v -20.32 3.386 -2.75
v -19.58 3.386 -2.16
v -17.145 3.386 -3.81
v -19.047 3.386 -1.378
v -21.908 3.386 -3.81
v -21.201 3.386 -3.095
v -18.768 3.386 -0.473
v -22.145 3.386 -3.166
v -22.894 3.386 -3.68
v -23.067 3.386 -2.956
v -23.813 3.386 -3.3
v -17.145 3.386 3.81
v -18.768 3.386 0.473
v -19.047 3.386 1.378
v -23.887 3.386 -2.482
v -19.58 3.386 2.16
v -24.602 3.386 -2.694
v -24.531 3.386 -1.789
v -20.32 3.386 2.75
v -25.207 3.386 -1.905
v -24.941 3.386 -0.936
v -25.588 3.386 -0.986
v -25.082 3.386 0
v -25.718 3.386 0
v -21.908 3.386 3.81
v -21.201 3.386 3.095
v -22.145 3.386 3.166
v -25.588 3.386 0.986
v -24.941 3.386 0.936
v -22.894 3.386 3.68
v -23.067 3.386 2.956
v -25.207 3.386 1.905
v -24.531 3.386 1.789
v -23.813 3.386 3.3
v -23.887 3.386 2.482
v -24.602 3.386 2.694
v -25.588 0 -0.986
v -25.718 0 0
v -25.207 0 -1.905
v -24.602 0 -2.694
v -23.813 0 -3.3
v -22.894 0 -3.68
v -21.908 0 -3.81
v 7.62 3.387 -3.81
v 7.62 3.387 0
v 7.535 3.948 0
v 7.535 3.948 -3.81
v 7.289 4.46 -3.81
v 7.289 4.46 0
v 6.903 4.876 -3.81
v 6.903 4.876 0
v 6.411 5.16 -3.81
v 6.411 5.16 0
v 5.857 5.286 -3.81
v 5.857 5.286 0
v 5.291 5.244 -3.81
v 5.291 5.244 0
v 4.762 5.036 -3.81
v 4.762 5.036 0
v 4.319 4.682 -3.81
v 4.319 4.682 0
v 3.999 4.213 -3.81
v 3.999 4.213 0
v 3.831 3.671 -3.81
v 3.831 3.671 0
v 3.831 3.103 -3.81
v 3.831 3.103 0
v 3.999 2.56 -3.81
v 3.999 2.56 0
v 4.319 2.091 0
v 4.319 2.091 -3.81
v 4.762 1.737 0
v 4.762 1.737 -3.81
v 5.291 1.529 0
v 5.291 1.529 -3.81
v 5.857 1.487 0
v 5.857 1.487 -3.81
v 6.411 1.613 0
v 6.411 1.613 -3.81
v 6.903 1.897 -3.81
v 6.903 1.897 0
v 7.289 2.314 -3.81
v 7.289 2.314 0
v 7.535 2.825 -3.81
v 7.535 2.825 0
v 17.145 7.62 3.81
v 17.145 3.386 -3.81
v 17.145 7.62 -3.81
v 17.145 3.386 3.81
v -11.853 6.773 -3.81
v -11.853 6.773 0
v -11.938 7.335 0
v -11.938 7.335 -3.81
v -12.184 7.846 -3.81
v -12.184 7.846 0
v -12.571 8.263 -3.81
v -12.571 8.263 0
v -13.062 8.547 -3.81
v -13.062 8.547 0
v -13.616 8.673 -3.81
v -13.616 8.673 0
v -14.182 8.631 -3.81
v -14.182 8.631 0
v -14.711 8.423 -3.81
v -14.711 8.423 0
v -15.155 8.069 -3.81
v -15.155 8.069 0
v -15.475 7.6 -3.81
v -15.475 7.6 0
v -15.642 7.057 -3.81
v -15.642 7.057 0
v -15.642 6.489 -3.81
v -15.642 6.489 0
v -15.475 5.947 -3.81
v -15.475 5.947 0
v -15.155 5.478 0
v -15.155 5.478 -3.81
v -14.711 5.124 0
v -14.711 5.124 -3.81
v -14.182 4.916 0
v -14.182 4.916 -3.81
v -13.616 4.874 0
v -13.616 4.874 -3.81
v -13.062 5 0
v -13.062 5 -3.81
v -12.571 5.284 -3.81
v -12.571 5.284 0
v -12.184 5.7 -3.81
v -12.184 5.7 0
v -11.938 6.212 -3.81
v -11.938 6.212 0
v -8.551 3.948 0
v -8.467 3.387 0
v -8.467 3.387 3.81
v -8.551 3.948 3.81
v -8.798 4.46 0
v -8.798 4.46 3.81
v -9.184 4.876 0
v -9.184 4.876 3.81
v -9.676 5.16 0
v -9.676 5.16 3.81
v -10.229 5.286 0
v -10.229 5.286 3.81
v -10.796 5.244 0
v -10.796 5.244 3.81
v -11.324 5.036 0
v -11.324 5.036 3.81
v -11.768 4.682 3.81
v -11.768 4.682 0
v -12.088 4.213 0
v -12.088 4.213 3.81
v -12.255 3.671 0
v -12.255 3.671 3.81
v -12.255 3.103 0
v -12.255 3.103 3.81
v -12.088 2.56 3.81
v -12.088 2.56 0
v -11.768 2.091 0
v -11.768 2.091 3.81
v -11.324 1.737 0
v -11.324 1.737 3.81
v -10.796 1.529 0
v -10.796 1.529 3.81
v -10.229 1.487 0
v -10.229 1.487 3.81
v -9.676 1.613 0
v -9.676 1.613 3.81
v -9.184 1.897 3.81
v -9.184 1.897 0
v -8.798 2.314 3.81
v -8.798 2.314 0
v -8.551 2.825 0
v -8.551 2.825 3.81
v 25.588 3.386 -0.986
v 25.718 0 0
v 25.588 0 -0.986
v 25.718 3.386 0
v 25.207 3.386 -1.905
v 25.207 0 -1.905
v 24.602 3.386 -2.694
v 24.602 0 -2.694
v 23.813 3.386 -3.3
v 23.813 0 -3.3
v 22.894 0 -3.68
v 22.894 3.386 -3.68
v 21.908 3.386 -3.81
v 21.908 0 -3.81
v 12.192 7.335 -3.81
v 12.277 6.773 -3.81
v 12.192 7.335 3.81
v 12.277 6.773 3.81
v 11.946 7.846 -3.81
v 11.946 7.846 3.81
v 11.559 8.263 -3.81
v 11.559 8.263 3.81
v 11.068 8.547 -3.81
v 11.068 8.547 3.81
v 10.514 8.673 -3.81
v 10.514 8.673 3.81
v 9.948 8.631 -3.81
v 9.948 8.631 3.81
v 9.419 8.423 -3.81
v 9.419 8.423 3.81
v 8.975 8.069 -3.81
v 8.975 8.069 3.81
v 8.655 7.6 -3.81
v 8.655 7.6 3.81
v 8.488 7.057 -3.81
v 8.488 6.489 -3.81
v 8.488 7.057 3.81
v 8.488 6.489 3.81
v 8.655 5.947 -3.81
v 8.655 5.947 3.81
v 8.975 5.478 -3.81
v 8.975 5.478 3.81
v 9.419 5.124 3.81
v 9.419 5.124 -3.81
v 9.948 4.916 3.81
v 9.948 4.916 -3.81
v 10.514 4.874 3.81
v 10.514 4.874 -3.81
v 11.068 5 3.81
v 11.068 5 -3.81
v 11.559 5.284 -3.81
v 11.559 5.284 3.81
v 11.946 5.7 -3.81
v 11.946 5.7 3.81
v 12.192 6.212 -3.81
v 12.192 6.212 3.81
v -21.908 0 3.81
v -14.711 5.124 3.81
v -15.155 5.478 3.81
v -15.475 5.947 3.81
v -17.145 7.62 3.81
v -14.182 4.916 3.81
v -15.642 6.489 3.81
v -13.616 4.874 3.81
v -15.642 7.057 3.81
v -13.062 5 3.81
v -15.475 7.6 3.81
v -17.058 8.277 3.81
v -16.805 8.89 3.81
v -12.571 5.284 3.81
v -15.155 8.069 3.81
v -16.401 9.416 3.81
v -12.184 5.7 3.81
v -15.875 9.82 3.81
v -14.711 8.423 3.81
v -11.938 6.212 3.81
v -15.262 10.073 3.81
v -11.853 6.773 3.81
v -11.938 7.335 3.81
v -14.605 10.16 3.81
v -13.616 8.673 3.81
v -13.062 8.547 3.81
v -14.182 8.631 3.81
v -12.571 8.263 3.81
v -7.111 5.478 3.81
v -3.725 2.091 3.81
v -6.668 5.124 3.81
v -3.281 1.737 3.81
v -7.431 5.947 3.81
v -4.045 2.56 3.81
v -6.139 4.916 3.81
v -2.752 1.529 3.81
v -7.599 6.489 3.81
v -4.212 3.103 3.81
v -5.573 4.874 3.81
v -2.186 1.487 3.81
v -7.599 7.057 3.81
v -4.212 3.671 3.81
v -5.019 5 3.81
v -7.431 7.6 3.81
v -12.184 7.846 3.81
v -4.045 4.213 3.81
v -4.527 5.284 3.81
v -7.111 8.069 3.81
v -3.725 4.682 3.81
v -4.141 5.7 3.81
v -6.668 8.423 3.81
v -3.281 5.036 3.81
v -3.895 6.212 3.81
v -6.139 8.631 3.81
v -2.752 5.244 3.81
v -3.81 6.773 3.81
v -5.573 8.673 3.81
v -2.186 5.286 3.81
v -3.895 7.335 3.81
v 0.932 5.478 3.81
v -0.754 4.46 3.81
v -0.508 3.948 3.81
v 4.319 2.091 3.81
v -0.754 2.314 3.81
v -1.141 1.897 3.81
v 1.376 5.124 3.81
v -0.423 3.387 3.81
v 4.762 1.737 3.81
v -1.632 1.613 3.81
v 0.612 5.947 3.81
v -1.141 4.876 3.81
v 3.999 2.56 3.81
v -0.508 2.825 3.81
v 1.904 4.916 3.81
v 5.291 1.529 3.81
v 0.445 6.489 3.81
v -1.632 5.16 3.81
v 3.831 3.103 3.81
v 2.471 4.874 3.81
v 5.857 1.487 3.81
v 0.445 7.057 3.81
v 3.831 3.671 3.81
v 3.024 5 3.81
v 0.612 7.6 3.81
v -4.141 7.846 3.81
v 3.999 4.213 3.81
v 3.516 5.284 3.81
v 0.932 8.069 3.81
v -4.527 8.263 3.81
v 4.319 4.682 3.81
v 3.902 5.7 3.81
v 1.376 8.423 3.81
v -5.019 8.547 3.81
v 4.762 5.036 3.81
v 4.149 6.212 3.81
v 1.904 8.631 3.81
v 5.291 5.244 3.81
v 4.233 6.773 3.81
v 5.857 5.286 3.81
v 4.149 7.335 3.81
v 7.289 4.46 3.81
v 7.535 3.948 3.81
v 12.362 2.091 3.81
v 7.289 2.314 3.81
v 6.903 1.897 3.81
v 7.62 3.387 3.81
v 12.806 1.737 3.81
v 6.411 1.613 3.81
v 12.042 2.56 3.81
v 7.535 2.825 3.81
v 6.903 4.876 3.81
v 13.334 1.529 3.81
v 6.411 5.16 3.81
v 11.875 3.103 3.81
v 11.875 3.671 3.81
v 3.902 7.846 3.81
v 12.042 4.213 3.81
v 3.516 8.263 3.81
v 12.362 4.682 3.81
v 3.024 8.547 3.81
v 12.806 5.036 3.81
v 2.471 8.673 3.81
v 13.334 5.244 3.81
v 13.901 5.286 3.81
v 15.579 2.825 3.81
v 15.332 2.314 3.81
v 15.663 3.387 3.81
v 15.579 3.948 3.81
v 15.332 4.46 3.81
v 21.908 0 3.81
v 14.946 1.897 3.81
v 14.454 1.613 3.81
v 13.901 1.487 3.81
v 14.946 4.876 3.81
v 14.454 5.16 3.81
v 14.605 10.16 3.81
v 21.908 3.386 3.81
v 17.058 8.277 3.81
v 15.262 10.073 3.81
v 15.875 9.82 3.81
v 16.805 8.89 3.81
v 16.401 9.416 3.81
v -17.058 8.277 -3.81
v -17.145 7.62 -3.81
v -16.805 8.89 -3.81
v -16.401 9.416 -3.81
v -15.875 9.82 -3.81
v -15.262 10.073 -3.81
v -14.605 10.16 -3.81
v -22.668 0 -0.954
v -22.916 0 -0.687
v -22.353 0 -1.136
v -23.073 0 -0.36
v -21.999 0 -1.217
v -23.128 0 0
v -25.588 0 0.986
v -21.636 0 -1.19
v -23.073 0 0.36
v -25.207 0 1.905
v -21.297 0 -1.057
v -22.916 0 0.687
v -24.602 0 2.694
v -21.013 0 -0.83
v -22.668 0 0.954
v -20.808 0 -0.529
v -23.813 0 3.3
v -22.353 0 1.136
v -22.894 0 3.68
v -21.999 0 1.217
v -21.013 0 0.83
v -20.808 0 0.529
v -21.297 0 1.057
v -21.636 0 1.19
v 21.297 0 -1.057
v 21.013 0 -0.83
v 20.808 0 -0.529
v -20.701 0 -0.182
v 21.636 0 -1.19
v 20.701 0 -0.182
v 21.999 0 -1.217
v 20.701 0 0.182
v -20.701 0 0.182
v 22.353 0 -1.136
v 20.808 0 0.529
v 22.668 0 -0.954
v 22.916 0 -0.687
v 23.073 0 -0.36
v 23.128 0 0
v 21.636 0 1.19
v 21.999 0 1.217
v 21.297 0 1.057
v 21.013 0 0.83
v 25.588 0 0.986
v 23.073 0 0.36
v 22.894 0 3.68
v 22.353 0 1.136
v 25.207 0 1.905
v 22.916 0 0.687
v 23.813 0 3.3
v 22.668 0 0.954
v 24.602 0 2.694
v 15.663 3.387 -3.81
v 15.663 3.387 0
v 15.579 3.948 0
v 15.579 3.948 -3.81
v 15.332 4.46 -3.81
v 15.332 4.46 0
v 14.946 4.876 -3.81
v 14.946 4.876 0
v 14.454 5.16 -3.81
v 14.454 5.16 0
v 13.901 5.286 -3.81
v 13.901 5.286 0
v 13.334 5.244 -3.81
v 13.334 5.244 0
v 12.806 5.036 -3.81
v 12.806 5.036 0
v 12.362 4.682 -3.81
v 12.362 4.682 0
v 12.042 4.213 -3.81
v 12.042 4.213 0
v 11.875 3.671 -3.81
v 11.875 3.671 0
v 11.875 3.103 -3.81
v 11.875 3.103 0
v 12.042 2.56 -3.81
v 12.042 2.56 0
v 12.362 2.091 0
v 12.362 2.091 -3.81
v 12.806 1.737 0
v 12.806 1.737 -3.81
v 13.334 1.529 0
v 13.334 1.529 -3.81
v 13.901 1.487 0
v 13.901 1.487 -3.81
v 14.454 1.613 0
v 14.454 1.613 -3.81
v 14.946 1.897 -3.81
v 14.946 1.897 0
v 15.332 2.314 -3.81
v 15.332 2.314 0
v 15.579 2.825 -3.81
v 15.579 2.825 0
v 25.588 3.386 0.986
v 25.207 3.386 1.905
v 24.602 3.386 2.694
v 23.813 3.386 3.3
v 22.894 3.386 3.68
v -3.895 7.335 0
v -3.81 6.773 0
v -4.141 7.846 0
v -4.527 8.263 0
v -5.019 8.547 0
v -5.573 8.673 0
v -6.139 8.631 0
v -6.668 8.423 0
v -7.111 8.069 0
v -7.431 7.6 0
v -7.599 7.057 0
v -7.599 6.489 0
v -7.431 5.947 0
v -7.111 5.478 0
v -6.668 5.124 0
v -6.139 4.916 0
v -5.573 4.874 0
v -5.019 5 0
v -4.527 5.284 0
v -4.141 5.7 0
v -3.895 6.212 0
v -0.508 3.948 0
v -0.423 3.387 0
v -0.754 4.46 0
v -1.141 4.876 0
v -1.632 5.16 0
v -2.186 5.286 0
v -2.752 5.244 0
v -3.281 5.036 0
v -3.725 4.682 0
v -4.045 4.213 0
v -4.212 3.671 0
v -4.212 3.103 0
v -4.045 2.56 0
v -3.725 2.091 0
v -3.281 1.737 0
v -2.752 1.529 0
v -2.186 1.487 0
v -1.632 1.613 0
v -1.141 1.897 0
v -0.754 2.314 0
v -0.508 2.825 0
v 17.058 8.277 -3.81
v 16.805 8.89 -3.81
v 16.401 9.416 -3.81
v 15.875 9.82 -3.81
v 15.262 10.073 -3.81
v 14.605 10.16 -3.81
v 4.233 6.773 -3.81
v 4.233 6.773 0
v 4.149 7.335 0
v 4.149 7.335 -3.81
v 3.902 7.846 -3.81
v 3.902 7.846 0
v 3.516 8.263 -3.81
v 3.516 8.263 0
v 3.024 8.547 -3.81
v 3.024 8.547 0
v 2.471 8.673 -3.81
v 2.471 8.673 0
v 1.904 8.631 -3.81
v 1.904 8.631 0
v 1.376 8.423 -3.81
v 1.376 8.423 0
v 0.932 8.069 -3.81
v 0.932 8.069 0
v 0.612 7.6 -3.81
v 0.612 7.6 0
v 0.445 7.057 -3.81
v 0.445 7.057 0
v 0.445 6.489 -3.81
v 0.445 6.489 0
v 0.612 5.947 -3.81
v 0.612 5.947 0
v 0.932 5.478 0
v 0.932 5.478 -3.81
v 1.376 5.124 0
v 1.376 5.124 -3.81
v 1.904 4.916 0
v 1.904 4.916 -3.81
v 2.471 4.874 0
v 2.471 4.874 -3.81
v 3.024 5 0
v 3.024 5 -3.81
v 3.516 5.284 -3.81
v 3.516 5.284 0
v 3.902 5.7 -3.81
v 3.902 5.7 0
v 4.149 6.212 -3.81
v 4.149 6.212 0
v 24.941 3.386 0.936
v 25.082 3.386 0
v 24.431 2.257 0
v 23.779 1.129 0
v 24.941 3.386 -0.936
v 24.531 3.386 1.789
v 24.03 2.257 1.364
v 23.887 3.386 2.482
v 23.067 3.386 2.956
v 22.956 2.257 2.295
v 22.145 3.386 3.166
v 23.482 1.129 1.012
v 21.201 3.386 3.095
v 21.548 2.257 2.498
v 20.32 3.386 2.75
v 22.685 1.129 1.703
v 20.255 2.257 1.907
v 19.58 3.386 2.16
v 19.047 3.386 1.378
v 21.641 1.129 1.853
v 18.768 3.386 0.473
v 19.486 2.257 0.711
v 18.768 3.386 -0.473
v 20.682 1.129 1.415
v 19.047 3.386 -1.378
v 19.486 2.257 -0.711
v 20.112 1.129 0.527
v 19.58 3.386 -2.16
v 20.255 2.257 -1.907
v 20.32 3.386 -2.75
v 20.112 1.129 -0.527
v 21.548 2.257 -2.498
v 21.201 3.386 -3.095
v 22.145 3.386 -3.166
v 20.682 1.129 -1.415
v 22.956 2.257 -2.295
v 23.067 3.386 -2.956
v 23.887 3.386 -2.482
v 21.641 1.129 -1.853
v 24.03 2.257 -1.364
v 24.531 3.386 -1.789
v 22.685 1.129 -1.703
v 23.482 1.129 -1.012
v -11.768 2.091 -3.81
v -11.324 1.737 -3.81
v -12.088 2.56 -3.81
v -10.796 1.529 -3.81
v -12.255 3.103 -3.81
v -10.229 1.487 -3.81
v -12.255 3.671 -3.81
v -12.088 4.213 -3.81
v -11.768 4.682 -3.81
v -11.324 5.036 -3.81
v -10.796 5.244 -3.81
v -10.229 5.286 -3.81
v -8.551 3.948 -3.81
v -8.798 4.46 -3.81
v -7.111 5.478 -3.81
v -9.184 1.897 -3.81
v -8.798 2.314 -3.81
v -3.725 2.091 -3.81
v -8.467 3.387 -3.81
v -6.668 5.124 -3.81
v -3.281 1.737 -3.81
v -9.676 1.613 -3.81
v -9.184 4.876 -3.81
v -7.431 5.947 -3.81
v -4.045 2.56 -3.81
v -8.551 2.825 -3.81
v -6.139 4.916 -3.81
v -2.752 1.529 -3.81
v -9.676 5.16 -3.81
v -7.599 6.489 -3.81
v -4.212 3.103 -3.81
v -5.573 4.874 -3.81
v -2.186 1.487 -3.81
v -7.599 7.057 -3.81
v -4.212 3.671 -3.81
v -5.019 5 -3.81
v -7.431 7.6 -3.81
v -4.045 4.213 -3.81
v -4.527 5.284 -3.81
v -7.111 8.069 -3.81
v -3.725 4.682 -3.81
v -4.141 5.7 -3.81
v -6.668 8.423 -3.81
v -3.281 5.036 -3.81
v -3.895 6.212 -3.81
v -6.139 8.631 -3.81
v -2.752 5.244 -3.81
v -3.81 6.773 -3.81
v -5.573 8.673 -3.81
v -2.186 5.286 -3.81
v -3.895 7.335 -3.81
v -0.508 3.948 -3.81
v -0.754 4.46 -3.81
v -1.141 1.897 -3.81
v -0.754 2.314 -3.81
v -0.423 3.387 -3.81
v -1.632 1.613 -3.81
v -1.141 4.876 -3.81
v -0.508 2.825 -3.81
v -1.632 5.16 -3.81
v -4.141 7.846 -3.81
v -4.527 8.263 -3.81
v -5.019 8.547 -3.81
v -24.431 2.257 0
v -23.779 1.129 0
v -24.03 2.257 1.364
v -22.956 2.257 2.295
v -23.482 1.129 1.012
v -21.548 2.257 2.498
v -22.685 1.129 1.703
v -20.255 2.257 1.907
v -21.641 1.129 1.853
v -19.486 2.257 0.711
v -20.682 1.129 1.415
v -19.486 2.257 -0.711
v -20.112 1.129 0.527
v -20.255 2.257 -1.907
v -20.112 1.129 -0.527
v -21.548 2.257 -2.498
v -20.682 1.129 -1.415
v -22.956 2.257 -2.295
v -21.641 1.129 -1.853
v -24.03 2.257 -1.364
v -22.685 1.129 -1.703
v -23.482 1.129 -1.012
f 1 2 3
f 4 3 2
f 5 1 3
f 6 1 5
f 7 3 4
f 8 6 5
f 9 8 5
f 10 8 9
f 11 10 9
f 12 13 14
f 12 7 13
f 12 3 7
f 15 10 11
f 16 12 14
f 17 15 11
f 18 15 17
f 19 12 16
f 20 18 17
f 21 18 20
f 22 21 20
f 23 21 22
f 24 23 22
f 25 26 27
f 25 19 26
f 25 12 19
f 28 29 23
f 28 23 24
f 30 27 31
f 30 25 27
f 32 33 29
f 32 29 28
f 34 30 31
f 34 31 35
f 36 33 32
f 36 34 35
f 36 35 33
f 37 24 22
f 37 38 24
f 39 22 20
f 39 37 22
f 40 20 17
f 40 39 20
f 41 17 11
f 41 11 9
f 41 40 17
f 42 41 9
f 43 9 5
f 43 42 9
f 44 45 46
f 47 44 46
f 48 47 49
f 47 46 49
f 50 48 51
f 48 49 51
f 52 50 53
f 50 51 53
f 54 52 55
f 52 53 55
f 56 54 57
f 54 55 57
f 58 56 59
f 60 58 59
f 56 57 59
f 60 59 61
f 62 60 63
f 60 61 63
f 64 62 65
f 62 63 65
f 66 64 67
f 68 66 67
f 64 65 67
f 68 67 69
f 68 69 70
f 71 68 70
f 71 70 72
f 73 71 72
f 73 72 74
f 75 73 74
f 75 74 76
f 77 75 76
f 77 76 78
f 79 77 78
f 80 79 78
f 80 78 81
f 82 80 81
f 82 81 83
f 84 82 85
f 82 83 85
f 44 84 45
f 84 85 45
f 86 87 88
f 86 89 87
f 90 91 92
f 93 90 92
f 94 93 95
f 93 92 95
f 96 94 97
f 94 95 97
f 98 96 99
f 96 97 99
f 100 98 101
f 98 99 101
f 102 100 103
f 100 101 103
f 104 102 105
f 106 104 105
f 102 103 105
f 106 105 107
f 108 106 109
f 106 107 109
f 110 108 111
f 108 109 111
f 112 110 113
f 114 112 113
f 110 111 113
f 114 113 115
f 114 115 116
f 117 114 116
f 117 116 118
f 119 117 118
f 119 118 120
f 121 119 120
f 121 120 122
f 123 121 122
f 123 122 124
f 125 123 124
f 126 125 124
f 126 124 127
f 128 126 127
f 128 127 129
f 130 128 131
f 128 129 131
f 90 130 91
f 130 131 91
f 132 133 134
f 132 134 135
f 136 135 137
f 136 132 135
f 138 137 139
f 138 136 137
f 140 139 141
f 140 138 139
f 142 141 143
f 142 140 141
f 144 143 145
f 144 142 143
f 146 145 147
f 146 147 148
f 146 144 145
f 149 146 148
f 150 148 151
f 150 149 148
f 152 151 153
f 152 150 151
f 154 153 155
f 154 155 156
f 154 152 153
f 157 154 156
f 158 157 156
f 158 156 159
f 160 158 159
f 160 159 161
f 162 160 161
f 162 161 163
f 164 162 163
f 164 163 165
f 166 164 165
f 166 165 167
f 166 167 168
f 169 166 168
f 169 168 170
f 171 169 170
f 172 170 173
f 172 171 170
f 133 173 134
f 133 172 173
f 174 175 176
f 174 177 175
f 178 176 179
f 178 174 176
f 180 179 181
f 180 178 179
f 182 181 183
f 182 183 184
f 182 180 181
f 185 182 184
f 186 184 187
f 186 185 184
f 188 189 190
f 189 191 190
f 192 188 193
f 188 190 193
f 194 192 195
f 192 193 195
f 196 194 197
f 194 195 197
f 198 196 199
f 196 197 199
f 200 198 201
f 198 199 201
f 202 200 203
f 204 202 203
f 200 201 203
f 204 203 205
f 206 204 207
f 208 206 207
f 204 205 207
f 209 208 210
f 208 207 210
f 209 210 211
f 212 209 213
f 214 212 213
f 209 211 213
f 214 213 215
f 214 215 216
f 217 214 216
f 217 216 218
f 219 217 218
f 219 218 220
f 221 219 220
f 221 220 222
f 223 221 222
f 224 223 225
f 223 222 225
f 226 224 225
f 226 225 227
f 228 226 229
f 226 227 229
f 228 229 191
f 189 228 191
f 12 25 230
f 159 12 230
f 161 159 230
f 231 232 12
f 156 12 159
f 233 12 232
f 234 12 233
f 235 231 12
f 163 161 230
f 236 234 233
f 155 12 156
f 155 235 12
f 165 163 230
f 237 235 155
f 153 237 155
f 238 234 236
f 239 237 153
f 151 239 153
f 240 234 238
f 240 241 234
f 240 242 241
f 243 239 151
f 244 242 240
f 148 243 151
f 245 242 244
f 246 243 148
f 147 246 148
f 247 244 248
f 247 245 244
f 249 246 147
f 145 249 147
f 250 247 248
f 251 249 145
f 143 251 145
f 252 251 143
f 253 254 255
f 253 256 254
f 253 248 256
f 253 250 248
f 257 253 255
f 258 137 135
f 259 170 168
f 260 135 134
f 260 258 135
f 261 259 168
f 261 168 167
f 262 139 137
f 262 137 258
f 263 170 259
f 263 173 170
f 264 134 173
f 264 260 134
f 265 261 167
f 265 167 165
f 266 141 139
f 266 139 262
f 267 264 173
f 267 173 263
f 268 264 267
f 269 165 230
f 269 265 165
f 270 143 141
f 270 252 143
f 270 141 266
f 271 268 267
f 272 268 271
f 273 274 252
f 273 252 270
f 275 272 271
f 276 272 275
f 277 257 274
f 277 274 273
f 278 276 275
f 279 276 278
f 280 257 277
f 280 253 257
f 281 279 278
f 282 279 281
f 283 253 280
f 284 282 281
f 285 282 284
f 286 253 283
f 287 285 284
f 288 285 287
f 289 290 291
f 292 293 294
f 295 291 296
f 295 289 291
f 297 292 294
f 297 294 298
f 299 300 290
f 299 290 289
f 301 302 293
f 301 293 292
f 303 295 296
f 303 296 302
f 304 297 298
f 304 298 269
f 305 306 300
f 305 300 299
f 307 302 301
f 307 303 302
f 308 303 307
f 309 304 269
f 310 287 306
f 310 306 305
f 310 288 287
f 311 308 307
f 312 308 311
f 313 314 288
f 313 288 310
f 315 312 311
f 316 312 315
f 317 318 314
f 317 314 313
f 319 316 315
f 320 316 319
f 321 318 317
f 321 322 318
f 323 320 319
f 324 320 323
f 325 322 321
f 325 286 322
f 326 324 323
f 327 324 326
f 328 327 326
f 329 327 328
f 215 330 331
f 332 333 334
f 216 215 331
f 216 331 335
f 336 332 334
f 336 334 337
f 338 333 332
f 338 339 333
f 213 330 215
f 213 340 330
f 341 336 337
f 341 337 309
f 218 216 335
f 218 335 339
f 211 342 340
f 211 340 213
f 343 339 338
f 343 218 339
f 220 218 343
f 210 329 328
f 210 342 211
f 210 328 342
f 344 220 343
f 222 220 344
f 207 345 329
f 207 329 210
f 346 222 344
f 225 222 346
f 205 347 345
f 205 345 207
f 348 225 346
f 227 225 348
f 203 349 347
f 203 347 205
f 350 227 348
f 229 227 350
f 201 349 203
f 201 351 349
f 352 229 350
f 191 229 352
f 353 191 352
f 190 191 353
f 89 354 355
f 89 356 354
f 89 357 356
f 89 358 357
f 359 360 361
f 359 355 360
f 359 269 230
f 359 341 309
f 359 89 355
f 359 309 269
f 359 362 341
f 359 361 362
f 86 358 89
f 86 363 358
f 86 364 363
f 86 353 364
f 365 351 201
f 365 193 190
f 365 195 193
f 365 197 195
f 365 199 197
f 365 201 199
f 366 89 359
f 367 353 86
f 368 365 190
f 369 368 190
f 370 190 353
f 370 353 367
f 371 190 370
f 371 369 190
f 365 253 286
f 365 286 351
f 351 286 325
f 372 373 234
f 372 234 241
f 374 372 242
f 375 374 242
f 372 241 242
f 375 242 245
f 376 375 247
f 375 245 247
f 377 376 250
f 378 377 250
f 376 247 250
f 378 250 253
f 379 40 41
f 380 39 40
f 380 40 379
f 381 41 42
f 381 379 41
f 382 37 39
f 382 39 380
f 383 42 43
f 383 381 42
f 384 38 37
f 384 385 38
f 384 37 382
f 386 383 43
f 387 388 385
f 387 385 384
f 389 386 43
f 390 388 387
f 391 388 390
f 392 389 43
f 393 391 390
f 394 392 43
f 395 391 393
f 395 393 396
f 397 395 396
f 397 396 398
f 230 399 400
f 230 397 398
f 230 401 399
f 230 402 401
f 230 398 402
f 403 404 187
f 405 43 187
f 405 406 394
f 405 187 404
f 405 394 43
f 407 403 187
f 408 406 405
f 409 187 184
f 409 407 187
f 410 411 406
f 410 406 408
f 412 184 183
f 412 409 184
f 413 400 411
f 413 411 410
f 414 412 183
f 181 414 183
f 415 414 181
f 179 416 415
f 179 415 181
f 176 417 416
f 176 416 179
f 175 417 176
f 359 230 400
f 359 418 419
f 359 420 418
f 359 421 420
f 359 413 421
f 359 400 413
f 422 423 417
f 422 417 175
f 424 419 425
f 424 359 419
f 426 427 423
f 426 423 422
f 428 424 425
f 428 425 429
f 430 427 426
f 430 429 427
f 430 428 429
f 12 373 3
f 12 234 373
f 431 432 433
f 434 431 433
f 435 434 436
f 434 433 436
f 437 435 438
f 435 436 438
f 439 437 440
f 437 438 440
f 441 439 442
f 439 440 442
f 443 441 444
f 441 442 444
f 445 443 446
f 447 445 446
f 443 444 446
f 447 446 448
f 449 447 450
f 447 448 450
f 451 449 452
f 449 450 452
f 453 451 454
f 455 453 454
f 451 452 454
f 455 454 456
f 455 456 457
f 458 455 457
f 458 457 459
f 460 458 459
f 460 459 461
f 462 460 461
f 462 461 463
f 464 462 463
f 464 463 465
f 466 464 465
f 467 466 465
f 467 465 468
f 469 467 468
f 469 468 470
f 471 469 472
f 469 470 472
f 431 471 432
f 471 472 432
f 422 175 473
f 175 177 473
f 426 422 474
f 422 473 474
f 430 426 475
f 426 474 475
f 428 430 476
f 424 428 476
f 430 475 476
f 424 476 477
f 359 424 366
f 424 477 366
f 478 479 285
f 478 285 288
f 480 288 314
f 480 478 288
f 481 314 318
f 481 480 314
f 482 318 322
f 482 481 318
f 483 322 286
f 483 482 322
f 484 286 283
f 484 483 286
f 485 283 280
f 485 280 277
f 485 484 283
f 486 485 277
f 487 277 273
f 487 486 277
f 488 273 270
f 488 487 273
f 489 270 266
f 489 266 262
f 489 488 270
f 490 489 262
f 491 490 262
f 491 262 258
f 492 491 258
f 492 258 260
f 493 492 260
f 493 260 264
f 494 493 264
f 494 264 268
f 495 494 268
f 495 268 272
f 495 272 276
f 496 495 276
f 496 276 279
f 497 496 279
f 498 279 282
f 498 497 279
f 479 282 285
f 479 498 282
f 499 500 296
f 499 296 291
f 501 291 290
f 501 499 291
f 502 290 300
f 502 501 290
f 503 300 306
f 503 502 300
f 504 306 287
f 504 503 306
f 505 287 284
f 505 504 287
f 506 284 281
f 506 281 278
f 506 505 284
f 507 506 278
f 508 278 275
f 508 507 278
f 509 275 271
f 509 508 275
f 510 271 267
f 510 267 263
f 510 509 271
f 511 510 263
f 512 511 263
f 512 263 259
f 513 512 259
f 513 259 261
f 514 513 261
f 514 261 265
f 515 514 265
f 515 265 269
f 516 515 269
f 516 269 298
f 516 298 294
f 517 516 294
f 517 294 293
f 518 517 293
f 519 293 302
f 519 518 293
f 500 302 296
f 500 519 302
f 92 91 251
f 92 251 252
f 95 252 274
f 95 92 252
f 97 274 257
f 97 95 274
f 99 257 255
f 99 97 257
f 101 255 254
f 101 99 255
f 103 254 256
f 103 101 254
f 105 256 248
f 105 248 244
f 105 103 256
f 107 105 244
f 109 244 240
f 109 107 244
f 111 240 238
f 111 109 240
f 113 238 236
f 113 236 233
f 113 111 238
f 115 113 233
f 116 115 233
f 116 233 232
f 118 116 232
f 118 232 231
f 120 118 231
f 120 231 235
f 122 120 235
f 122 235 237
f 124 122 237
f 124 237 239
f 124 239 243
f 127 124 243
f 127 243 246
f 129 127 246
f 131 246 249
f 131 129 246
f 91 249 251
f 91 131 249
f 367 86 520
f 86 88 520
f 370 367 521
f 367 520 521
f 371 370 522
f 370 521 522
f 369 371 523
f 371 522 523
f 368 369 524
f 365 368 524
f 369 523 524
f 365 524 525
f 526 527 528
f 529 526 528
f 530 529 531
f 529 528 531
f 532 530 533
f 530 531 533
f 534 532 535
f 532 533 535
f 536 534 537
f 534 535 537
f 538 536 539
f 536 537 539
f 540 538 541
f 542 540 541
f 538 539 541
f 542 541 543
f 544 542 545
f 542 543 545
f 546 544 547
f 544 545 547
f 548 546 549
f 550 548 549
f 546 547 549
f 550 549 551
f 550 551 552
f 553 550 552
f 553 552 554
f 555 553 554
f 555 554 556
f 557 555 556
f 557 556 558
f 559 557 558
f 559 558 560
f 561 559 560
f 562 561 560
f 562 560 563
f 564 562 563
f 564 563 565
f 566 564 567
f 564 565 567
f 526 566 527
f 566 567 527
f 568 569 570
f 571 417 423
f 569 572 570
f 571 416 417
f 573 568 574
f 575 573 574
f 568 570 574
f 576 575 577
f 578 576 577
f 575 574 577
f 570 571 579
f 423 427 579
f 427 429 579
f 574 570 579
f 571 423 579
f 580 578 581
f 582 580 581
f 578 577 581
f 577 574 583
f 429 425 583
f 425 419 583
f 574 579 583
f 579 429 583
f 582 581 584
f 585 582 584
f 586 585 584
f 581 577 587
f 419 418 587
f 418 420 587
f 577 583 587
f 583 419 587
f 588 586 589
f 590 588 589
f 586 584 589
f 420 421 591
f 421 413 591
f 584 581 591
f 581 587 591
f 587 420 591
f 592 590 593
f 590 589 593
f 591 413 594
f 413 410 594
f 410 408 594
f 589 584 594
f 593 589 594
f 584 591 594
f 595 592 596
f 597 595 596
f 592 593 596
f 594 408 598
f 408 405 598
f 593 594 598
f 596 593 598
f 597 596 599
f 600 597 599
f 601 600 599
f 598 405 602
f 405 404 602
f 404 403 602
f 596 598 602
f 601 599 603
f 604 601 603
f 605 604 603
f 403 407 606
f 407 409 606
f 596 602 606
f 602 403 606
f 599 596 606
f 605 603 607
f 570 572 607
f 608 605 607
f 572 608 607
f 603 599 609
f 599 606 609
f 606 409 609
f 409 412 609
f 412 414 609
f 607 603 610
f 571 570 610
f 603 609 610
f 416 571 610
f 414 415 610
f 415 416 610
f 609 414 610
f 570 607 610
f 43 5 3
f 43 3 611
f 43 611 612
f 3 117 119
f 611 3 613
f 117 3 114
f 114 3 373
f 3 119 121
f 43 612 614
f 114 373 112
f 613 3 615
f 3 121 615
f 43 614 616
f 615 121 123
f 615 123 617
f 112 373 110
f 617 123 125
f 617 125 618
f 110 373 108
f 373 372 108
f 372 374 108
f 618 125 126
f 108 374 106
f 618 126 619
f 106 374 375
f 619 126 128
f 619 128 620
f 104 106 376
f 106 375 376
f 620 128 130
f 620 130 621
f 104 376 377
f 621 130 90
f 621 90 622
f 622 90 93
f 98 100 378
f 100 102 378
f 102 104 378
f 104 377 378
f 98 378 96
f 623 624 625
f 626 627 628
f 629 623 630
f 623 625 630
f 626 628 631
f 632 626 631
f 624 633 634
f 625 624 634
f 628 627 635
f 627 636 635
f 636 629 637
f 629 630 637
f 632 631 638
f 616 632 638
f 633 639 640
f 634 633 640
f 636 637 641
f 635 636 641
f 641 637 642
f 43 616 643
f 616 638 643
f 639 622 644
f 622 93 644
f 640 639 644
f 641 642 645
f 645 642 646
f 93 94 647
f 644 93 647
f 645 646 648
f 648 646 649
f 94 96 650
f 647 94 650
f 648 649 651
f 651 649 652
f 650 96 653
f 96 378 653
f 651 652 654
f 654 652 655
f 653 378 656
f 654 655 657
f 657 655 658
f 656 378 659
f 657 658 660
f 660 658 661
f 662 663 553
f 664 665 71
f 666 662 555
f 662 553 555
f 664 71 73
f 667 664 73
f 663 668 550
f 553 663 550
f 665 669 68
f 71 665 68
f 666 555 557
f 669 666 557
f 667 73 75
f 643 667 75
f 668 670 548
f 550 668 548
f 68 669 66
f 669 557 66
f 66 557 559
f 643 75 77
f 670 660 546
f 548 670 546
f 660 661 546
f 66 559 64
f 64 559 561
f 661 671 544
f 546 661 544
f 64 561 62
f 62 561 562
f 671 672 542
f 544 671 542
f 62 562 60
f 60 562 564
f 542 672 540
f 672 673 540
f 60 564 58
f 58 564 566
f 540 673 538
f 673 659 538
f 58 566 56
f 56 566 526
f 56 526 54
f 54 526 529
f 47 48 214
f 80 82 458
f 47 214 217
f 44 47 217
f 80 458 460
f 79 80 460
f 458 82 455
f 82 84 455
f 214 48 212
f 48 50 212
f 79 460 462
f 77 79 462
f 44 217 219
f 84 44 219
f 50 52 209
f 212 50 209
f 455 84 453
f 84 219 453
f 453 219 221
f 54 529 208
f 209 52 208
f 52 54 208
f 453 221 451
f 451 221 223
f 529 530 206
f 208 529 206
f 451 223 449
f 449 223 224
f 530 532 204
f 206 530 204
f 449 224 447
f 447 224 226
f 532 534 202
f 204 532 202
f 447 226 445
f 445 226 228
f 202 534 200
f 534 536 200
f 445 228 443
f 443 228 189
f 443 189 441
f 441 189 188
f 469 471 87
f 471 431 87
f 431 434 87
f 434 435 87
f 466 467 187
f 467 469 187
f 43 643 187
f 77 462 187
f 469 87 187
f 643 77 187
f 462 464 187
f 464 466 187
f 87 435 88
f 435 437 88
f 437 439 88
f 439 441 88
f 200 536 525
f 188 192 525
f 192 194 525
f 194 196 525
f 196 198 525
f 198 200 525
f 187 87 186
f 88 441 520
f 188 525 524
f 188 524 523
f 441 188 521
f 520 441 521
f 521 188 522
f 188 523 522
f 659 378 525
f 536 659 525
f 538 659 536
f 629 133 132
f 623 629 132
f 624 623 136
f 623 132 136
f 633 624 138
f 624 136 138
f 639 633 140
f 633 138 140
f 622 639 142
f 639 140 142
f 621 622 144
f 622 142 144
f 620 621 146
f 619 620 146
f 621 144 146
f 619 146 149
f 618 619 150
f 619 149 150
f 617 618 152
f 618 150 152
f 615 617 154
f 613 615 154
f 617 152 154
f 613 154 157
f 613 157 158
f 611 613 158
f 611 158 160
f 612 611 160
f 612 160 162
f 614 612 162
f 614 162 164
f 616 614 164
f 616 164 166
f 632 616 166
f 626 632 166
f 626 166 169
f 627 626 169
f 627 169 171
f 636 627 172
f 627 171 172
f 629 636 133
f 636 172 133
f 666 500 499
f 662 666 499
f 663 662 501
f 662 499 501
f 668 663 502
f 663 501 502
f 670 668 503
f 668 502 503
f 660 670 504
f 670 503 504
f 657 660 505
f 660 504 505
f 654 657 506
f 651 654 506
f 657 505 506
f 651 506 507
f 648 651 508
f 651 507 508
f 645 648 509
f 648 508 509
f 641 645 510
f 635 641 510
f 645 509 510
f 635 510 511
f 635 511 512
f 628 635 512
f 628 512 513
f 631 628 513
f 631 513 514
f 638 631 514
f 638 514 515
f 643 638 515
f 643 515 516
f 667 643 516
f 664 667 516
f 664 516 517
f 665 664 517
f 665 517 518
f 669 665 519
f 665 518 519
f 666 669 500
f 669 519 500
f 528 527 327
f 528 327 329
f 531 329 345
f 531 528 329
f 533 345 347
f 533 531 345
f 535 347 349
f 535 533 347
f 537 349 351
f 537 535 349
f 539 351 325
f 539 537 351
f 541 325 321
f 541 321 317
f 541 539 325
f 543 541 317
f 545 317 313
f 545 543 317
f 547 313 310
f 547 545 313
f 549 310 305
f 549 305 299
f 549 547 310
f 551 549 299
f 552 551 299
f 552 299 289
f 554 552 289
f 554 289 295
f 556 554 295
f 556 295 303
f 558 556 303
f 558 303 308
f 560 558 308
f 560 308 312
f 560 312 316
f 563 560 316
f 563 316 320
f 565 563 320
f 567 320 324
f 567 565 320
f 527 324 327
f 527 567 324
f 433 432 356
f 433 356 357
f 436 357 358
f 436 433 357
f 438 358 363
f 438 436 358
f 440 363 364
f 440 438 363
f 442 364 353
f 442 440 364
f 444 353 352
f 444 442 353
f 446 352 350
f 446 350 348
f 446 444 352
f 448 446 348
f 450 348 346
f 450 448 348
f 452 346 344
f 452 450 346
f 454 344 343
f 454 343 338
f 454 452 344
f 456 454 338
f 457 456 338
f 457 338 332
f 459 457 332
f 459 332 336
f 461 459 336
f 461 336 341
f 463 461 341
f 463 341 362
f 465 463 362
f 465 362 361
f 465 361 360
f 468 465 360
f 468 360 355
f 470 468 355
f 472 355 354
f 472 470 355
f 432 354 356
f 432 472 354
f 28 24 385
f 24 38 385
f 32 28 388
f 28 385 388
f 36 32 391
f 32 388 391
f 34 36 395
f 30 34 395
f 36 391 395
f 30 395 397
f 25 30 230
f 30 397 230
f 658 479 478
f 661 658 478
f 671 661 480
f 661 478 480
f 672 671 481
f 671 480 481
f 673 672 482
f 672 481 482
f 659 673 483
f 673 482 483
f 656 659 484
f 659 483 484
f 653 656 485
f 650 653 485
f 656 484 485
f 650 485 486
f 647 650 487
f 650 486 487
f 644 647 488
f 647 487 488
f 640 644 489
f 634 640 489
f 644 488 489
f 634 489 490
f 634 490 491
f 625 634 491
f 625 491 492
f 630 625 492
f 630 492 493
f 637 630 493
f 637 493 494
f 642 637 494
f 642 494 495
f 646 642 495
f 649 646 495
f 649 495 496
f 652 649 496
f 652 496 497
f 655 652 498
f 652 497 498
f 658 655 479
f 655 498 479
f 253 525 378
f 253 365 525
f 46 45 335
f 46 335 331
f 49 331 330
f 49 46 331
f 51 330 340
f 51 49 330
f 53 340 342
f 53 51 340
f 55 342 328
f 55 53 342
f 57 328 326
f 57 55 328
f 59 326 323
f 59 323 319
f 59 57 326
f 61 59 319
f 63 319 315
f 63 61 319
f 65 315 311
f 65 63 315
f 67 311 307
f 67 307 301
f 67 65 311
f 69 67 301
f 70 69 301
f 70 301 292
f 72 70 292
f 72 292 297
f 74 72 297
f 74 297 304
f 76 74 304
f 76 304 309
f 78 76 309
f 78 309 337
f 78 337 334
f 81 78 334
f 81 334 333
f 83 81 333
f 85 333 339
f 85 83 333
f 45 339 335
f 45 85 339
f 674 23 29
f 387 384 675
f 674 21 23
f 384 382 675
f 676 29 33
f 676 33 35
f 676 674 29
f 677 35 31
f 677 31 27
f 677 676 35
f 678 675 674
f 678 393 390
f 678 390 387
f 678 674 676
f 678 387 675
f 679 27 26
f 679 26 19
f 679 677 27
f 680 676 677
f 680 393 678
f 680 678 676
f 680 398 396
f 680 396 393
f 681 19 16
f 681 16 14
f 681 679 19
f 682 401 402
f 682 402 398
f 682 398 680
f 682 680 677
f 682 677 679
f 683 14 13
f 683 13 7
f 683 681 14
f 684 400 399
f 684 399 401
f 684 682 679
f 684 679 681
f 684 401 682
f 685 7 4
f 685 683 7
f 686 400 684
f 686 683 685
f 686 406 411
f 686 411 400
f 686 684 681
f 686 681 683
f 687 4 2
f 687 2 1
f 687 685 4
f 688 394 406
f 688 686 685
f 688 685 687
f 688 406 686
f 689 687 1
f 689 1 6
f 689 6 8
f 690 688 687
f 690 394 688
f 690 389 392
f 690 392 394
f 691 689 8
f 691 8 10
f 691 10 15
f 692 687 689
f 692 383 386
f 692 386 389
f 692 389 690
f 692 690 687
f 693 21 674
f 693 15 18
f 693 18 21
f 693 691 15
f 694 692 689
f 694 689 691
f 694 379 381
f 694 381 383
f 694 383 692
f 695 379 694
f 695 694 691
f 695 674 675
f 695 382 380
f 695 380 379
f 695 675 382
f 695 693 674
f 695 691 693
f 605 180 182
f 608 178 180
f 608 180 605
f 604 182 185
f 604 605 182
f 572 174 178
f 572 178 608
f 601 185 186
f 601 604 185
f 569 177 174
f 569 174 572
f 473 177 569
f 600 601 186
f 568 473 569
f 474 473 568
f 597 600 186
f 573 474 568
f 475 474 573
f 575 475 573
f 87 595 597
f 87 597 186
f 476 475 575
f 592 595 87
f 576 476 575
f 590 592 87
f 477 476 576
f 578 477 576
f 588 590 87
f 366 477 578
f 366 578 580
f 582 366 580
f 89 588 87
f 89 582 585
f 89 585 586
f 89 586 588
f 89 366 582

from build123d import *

# Parameters (mm, degrees)
F1_DEPTH = 3.81
F3_R     = 3.80999
F4_R     = 2.54
F2_R     = 1.905
F5_DEPTH = 3.81


# Not quite as in the source:
# - a fillet or chamfer is up to 0.001 mm smaller than in the source, because OpenCascade refuses the exact size
# - a pattern or mirror of a feature is missing from the dataset's text; its kind, count and spacing are read off the source's solid


with BuildPart() as f1:
    # F0 (on Top) → F1 (new body, symmetric)
    with BuildSketch(Plane.XY):
        Polygon((17.145, 10.16), (0, 10.16), (-17.145, 10.16), (-17.145, 3.38582), (-25.7175, 3.38582), (-25.7175, 0), (0, 0), (25.7175, 0), (25.7175, 3.38582), (17.145, 3.38582), align=None)
    extrude(amount=F1_DEPTH, both=True)

    # F3 (radius 3.81 in the source; OpenCascade refuses exactly that, so slightly less here)
    f3_edges = [f1.edges().sort_by_distance(p)[0] for p in [
        (-25.7175, 1.69291, 3.81),
        (-25.7175, 1.69291, -3.81),
        (25.7175, 1.69291, 3.81),
        (25.7175, 1.69291, -3.81),
    ]]
    fillet(f3_edges, radius=F3_R)

    # F4
    f4_edges = [f1.edges().sort_by_distance(p)[0] for p in [
        (-17.145, 10.16, 0),
        (17.145, 10.16, 0),
    ]]
    fillet(f4_edges, radius=F4_R)

    # F2 (on Top) → F5 (cut, symmetric)
    with BuildSketch(Plane.XY):
        with Locations((-13.7583333333, 6.7733333333)):
            Circle(F2_R)
        with Locations((-10.3716666667, 3.3866666667)):
            Circle(F2_R)
        with Locations((-2.3283333333, 3.3866666667)):
            Circle(F2_R)
        with Locations((-5.715, 6.7733333333)):
            Circle(F2_R)
        with Locations((5.715, 3.3866666667)):
            Circle(F2_R)
        with Locations((2.3283333333, 6.7733333333)):
            Circle(F2_R)
        with Locations((13.7583333333, 3.3866666667)):
            Circle(F2_R)
        with Locations((10.3716666667, 6.7733333333)):
            Circle(F2_R)
    extrude(amount=F5_DEPTH, both=True, mode=Mode.SUBTRACT)

    # F6 (on Top) → F7 (revolve, cut)
    with BuildSketch(Plane.XY):
        Polygon((-21.9075, -2.113441314), (-21.9075, 3.38582), (-25.0825, 3.38582), align=None)
    f7 = revolve(axis=Axis((-21.9075, 0.636189343, 0), (0, 1, 0)), mode=Mode.SUBTRACT)

    # F7_copies: F7 across plane
    add(f7.mirror(Plane(origin=(0, 0, 0), x_dir=(0, 0, 1), z_dir=(1, 0, 0))), mode=Mode.SUBTRACT)


solid = f1.part
